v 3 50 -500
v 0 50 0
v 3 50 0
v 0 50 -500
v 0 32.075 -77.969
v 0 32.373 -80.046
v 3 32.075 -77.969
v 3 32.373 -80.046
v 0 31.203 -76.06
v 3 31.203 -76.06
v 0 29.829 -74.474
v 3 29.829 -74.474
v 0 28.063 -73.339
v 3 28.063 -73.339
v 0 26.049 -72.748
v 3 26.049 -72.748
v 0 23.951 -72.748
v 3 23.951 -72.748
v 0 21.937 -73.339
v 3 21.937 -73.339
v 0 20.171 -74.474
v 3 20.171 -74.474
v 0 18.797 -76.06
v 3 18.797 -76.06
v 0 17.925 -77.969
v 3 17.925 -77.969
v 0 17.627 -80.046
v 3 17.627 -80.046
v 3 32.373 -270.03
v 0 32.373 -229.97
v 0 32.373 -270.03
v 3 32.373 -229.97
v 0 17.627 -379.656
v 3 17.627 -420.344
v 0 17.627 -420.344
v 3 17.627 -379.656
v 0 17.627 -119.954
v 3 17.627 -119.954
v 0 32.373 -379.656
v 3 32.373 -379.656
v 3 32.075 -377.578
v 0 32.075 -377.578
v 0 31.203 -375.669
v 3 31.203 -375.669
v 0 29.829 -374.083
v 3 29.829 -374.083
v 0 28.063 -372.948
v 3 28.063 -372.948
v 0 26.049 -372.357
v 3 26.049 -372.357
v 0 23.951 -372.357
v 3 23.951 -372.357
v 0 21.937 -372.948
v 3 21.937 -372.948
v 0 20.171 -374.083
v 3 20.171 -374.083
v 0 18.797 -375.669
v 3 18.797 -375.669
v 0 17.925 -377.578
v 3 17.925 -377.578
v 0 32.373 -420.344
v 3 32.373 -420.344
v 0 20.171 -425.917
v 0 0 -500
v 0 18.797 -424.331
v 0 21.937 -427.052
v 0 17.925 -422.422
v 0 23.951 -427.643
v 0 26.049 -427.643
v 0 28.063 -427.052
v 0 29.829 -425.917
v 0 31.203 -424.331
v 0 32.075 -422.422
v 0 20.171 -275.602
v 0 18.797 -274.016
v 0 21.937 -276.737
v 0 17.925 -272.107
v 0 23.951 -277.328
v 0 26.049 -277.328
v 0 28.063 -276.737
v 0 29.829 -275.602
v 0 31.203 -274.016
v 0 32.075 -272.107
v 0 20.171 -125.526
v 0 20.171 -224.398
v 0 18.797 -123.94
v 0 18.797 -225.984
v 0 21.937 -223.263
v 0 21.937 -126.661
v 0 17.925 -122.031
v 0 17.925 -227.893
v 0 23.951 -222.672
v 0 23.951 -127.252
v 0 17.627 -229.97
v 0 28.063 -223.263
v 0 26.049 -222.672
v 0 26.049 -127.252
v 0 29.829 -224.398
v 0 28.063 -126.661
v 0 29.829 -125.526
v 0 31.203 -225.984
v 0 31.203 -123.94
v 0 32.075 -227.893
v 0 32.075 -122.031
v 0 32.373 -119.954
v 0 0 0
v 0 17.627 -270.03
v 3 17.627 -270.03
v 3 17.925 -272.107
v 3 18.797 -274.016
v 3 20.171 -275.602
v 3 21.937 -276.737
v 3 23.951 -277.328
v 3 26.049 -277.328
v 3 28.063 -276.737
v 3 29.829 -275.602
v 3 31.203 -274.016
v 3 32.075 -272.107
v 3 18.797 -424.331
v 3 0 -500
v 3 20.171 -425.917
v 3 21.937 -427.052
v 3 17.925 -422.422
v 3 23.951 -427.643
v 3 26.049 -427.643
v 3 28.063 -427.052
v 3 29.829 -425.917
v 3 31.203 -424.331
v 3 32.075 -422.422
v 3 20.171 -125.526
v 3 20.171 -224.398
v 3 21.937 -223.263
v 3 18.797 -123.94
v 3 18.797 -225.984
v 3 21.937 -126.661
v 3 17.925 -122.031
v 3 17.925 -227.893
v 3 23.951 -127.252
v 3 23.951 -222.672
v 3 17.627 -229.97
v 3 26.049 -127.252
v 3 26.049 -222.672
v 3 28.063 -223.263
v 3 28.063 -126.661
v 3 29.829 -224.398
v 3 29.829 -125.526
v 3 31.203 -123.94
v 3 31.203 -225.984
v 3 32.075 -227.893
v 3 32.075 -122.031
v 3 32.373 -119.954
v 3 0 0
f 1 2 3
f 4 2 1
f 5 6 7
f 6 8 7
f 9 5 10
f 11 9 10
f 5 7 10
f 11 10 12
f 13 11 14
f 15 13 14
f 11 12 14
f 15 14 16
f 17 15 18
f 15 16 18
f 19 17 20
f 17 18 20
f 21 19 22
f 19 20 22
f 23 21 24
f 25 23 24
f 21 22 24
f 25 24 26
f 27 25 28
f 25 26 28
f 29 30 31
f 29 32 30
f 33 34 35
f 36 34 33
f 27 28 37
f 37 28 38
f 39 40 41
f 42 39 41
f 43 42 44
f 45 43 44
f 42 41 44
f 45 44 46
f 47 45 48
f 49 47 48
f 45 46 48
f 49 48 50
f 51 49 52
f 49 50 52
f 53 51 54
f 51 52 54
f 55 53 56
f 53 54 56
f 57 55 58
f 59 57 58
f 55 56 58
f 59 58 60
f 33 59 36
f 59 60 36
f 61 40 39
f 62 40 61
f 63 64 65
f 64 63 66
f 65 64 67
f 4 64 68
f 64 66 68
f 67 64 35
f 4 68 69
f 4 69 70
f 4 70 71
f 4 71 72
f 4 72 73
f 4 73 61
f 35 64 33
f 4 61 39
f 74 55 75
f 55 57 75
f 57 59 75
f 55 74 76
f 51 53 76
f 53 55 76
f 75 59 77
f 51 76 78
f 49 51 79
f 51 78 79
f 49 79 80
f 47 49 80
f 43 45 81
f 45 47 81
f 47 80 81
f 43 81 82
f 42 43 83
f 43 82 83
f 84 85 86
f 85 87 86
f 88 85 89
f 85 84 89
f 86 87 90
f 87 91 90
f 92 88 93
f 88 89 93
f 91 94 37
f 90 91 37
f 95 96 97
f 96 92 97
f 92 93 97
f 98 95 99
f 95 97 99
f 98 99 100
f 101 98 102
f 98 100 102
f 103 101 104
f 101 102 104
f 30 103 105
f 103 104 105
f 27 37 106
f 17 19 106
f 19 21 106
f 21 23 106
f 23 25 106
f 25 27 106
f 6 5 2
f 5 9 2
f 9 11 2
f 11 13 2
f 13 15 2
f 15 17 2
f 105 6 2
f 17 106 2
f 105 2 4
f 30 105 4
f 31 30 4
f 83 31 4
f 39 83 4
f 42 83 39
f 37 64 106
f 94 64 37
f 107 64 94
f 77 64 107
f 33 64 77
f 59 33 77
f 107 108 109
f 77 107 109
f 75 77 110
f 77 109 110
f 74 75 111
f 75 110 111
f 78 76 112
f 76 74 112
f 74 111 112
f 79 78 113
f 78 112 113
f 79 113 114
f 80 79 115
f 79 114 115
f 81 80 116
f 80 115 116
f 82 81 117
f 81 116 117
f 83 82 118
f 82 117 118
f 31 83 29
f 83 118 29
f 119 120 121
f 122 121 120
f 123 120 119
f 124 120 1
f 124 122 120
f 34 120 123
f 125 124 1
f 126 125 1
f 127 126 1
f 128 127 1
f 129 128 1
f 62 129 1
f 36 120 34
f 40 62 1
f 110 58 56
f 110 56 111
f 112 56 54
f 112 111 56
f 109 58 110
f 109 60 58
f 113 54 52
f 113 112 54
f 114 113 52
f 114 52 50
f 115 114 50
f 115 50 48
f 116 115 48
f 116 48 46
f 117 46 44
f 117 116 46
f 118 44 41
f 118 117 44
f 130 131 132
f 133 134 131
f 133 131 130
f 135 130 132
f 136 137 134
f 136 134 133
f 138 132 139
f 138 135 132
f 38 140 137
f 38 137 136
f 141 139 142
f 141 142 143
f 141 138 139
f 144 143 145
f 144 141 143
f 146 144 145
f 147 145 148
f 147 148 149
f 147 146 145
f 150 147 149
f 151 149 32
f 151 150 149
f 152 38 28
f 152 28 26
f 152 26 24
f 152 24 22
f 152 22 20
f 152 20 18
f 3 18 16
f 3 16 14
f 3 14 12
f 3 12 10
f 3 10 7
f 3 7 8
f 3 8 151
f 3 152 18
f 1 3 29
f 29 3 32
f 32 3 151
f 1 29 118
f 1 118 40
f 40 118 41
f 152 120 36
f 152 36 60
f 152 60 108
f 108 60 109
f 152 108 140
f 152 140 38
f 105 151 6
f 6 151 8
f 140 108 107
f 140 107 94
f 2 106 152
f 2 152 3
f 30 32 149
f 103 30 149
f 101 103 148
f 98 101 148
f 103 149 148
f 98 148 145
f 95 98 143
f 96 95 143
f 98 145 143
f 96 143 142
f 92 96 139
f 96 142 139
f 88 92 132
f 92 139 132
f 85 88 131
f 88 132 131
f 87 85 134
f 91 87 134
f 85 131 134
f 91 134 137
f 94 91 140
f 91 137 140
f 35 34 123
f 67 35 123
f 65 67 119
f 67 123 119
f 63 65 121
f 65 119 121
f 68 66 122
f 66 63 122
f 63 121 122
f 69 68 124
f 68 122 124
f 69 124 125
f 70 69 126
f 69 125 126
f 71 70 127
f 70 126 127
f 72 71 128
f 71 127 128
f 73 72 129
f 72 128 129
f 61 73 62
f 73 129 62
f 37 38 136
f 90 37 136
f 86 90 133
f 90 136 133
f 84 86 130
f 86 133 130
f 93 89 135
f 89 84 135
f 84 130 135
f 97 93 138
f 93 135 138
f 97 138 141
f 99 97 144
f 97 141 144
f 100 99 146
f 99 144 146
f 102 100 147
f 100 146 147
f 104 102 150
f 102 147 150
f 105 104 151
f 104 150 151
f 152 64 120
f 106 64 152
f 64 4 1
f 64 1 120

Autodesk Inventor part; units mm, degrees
ref_plane "YZ Plane" through (0, 0, 0) normal (1, 0, 0) x (0, 1, 0)
ref_plane "XZ Plane" through (0, 0, 0) normal (0, 1, 0) x (-1, 0, 0)
ref_plane "XY Plane" through (0, 0, 0) normal (0, 0, 1) x (1, 0, 0)
sketch "Sketch1" plane through (0, 0, 0) normal (1, 0, 0) x (0, 1, 0)
  line L0 (0, 0) -> (50, 0)
  line L1 (50, 0) -> (50, -500)
  line L2 (50, -500) -> (0, -500)
  line L3 (0, -500) -> (0, 0)
  dimension "d0" = 50
  dimension "d1" = 500
extrude "Plate1" add sketch "Sketch1" along normal blind 3
sketch "Sketch2" plane through (3, 0, 0) normal (1, 0, 0) x (0, 0, -1)
  line L0 (0, 50) -> (0, 0) projected
  line L1 (0, 25) -> (100, 25)
  line L2 (500, 0) -> (500, 50) projected
  line L3 (500, 25) -> (400, 25)
  line L4 (100, 25) -> (400, 25)
  line L5 (80.0463, 25) -> (119.9537, 25) construction
  line L6 (80.0463, 17.6266) -> (119.9537, 17.6266)
  line L7 (119.9537, 32.3734) -> (80.0463, 32.3734)
  arc A0 (80.0463, 32.3734) -> (80.0463, 17.6266) centre (80.0463, 25) ccw
  arc A1 (119.9537, 17.6266) -> (119.9537, 32.3734) centre (119.9537, 25) ccw
  line L8 (270.0297, 25) -> (229.9703, 25) construction
  line L9 (270.0297, 17.6266) -> (229.9703, 17.6266)
  line L10 (229.9703, 32.3734) -> (270.0297, 32.3734)
  arc A2 (270.0297, 17.6266) -> (270.0297, 32.3734) centre (270.0297, 25) ccw
  arc A3 (229.9703, 32.3734) -> (229.9703, 17.6266) centre (229.9703, 25) ccw
  line L11 (420.3445, 25) -> (379.6555, 25) construction
  line L12 (420.3445, 17.6266) -> (379.6555, 17.6266)
  line L13 (379.6555, 32.3734) -> (420.3445, 32.3734)
  arc A4 (420.3445, 17.6266) -> (420.3445, 32.3734) centre (420.3445, 25) ccw
  arc A5 (379.6555, 32.3734) -> (379.6555, 17.6266) centre (379.6555, 25) ccw
  point P0 (250, 25)
  dimension "d3" = 100
  dimension "d4" = 100
extrude "Cut1" cut sketch "Sketch2" against normal blind 3
equation "\"d5\" = Thickness"
equation "\"d2\" = Thickness"
equation "\"BendRadius\" = Thickness"
equation "\"BendReliefWidth\" = Thickness"
equation "\"BendReliefDepth\" = 0.5 * Thickness"
equation "\"CornerReliefSize\" = 4 * Thickness"
equation "\"MinimumRemnant\" = 2 * Thickness"
equation "\"TransitionRadius\" = BendRadius"
equation "\"JacobiRadiusSize\" = BendRadius"
equation "\"GapSize\" = Thickness"
equation "\"Thickness\" = 3"
properties part number "FLoor Frame, Small" material "Aluminum 6061"
